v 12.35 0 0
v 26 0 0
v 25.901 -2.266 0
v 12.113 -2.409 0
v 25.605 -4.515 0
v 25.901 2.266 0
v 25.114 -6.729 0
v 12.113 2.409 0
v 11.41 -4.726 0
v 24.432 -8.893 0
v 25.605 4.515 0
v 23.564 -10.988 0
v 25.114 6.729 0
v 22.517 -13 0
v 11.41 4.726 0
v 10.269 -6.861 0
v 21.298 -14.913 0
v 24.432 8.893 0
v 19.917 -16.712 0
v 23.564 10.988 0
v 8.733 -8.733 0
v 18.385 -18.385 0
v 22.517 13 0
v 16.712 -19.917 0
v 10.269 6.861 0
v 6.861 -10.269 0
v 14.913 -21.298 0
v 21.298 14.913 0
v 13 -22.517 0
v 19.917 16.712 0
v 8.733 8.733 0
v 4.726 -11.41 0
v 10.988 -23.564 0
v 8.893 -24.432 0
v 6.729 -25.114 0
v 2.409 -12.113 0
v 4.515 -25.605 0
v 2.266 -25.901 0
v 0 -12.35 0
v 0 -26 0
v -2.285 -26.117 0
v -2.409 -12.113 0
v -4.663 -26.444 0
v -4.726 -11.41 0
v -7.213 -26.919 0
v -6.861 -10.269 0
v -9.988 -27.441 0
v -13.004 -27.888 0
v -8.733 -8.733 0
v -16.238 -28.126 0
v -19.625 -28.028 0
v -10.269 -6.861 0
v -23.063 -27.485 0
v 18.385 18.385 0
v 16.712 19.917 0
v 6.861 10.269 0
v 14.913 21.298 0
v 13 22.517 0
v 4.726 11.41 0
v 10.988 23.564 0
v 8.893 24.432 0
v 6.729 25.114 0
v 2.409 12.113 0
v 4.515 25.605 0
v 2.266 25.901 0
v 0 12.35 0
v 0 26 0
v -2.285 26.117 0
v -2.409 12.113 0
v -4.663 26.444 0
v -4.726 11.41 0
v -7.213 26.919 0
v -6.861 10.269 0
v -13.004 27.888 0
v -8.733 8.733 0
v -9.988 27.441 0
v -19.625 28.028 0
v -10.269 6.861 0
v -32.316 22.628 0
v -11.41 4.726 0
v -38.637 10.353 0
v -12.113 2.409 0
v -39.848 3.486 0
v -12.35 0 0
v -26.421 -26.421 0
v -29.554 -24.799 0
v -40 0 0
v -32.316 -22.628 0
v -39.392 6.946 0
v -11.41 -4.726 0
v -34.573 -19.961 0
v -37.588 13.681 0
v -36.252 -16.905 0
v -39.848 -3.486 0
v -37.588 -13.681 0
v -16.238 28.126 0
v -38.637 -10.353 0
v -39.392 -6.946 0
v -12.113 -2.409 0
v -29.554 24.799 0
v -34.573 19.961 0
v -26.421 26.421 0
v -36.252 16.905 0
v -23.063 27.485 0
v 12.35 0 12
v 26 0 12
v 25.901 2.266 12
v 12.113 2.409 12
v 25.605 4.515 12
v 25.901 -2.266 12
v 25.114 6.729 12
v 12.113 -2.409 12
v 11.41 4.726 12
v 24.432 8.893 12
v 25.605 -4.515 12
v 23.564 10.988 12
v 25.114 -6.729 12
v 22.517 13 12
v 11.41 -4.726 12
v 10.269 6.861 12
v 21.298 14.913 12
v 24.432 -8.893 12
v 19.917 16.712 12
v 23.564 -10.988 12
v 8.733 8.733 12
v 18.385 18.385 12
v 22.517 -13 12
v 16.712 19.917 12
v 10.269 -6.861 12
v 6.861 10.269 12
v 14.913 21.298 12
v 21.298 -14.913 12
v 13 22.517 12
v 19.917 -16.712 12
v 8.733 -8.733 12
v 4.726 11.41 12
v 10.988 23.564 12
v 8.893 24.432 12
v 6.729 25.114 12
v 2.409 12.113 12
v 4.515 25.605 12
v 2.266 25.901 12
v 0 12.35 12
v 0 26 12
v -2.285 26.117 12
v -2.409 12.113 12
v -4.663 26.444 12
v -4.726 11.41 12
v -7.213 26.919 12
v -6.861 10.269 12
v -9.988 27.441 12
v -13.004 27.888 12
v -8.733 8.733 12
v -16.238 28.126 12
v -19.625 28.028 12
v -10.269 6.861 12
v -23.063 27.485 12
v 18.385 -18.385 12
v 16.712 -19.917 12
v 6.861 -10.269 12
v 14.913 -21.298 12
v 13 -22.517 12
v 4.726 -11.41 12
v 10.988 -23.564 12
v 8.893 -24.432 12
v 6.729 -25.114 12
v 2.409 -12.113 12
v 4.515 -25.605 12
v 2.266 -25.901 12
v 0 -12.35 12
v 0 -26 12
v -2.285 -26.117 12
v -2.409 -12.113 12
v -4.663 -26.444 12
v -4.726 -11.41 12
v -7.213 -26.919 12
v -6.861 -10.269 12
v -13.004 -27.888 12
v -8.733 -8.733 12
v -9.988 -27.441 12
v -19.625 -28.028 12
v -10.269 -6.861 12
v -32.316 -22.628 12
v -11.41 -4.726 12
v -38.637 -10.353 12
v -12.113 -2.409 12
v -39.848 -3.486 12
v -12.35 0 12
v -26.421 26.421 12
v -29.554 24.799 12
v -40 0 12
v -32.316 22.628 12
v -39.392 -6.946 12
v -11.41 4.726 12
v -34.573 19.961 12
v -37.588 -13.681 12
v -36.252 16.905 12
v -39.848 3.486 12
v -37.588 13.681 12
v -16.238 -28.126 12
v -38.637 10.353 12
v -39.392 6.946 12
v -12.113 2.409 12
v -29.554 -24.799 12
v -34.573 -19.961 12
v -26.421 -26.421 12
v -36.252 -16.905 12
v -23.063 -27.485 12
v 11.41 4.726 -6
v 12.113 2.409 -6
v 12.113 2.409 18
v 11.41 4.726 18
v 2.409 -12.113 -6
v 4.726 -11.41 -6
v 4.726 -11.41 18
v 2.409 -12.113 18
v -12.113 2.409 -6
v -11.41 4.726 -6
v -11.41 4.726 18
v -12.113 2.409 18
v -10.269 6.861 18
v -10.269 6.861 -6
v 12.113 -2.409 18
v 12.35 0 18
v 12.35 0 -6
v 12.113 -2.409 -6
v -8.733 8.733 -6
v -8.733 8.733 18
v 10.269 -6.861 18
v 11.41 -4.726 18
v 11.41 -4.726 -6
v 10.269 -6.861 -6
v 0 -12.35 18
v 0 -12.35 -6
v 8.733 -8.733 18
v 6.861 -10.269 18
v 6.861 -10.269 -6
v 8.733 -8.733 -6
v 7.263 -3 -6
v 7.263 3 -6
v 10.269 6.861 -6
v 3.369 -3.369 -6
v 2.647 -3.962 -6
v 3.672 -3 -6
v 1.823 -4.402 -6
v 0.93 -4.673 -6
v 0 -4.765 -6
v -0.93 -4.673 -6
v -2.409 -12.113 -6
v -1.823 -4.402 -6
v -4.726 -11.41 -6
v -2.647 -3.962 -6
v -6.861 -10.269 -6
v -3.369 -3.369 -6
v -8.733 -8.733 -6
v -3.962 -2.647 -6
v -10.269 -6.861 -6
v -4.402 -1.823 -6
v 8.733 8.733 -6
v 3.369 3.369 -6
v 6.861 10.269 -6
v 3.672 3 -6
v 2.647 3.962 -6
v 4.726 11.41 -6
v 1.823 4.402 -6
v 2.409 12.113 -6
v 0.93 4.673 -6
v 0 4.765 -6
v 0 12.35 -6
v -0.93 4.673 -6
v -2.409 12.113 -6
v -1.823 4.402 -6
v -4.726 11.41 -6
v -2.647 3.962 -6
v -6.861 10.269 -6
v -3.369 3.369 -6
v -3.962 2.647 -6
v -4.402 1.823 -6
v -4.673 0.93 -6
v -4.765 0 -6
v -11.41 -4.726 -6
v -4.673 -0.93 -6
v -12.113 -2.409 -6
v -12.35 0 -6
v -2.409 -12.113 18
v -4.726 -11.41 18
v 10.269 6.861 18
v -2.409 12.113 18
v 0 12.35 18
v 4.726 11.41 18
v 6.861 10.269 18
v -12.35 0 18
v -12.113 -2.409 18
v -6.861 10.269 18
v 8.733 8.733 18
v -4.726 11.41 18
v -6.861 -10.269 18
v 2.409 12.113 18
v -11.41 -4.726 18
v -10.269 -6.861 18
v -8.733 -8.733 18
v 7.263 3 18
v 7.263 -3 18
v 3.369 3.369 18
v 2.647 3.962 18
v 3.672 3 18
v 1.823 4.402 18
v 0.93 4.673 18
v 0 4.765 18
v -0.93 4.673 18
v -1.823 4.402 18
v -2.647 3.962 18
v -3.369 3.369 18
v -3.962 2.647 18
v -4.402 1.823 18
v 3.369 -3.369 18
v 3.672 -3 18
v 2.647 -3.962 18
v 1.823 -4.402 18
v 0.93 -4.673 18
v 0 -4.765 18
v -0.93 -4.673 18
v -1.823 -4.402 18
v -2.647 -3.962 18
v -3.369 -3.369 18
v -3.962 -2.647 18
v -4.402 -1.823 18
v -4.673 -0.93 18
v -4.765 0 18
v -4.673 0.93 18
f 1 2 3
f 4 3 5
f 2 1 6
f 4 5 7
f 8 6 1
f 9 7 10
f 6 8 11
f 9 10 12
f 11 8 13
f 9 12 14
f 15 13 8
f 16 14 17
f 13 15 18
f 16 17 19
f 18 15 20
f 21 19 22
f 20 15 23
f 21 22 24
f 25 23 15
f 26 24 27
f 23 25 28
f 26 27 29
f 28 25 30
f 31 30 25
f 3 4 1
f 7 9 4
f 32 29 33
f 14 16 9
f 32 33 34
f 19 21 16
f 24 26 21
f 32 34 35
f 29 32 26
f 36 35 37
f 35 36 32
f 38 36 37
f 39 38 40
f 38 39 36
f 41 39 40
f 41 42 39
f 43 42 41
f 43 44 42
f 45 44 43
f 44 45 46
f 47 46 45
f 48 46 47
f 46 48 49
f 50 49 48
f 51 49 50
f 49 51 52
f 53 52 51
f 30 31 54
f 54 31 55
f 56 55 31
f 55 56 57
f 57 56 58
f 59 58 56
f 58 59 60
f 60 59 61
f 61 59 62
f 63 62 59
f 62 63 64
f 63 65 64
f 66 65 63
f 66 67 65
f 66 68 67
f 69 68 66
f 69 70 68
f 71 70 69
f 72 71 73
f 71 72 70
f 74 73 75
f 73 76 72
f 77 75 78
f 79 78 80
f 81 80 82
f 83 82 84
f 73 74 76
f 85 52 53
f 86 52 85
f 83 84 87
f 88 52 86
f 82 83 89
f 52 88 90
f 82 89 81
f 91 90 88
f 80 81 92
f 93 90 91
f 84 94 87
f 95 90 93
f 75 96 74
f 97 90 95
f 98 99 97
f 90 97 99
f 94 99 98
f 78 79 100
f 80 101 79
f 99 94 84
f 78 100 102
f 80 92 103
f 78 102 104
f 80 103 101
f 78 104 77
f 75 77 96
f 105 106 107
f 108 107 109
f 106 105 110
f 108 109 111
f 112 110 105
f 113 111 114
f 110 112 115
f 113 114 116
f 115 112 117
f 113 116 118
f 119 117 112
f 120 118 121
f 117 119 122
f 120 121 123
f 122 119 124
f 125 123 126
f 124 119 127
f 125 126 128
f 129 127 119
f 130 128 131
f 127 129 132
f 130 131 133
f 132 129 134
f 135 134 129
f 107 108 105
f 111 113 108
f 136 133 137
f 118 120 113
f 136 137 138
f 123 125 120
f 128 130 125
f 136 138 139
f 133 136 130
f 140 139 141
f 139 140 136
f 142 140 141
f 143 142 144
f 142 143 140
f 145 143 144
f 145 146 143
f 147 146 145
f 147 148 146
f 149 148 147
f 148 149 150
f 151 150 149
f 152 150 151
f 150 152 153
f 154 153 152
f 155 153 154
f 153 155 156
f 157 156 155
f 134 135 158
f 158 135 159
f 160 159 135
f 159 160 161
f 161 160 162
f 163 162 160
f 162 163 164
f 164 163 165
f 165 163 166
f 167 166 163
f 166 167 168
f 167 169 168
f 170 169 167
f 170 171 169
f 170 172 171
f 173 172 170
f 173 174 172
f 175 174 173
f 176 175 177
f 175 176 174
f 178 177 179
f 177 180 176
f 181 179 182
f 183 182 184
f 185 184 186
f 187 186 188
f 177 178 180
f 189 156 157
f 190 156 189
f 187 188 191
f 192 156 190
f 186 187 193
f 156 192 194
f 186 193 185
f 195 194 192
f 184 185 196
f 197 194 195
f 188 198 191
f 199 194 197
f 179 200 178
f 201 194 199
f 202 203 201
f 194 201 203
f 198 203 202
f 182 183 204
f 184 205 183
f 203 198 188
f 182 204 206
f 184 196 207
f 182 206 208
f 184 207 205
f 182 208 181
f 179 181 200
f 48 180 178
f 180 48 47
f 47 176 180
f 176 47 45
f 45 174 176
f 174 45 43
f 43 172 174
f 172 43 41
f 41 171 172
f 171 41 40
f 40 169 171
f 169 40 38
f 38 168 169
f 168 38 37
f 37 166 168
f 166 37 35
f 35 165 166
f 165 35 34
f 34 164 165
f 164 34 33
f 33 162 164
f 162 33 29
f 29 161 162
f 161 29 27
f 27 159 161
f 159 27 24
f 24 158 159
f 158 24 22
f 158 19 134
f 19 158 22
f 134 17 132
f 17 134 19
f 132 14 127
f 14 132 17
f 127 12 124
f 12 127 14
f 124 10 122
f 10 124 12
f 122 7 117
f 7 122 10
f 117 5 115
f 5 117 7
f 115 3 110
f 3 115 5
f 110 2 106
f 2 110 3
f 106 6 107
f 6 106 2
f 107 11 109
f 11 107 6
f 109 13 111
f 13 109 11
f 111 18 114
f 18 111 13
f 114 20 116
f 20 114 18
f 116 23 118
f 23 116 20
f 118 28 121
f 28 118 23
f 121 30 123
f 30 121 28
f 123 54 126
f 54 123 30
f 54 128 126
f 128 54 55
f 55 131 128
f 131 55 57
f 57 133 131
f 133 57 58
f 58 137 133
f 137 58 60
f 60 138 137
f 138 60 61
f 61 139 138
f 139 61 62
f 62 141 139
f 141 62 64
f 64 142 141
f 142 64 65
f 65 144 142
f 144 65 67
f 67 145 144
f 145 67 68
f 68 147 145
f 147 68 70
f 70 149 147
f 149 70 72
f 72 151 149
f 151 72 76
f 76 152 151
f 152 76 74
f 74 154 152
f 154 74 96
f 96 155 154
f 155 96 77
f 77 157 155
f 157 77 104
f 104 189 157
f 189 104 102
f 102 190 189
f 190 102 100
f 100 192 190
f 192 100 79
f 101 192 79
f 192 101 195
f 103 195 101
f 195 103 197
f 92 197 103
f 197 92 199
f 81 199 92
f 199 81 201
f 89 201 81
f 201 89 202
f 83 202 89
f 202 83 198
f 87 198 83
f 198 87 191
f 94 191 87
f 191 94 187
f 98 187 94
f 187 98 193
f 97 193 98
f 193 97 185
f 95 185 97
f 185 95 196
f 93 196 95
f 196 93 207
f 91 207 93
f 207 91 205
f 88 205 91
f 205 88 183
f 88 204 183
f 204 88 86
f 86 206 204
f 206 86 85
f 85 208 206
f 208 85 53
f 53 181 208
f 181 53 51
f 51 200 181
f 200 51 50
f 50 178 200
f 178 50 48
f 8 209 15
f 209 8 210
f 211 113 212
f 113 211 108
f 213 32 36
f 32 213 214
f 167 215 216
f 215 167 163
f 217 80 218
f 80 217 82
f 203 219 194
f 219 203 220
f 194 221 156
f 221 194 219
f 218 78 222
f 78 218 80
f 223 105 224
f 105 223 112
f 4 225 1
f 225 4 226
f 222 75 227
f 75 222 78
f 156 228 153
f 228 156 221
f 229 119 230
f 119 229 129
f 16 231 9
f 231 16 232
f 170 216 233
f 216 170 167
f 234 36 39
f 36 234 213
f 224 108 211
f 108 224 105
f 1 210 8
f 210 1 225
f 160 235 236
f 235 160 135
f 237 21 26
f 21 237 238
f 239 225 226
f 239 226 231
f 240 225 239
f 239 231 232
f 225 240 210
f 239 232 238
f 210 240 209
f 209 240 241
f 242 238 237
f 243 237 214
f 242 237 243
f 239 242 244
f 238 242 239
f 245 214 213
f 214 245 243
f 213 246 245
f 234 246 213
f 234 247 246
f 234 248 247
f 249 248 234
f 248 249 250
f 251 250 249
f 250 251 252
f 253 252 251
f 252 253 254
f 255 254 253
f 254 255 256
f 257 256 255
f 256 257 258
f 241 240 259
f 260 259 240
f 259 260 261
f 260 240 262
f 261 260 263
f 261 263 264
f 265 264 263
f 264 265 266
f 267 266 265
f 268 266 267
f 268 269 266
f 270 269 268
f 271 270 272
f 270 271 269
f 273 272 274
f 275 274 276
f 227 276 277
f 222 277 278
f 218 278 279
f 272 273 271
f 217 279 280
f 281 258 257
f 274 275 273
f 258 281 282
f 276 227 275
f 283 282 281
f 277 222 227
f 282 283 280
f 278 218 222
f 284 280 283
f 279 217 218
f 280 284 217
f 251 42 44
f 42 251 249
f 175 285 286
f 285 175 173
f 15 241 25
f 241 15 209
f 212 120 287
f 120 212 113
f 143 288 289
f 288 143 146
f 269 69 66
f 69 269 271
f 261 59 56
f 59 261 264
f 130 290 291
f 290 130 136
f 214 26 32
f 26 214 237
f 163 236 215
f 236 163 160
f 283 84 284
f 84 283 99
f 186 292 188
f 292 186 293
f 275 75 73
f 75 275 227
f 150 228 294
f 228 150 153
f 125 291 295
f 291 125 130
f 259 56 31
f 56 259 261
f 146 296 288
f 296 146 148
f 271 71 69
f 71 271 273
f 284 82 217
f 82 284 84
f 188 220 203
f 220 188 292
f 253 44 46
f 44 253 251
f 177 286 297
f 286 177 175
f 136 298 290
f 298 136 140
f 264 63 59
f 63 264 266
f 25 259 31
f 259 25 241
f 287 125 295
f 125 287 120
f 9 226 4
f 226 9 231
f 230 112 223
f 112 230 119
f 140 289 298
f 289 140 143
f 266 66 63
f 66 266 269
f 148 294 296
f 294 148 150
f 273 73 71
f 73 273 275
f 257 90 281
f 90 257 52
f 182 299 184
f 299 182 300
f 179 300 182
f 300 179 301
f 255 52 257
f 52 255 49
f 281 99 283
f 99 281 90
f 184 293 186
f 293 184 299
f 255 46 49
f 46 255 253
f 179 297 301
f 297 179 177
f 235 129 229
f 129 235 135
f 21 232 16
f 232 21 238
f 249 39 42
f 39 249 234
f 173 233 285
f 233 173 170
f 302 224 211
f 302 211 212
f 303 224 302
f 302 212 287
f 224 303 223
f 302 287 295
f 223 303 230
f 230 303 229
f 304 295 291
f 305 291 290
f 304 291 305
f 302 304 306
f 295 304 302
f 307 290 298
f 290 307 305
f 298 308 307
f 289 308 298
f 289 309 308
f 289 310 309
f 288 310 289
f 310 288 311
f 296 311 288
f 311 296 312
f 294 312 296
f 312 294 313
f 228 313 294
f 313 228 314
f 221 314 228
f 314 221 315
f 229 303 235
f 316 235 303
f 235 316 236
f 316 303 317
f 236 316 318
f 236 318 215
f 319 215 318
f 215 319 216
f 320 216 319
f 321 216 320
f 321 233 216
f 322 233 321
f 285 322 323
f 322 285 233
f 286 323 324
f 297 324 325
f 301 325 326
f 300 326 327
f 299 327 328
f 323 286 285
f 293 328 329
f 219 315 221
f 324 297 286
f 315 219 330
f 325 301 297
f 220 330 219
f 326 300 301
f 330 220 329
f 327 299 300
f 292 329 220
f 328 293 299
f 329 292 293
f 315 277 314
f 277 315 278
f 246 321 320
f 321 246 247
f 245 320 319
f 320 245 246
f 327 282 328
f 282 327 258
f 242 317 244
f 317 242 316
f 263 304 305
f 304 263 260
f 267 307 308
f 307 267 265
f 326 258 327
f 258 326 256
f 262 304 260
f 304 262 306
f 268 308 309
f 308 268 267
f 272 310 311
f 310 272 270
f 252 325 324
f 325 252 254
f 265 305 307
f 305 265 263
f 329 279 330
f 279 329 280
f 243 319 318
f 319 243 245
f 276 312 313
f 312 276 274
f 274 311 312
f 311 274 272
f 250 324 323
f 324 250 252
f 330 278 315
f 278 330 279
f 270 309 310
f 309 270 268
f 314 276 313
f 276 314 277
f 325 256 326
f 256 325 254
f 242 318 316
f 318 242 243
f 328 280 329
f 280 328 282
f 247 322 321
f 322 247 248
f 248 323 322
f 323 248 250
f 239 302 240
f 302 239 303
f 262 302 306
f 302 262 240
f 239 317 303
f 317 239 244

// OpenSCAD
$fn = 32;

// ----------------------------------------------------------------------
// Cam: base radius 26 mm with a 14 mm lift over 180 degrees
// ----------------------------------------------------------------------

// --- parameters (mm) ---
base_r = 26;              // base radius
lift = 14;                // lift height above the base radius
lift_span = 180;          // angular width of the lift
lift_start = 90;          // angle where the lift starts
cam_t = 12;               // cam plate thickness
hub_d = 24.7;             // hub diameter
hub_h = 24;               // hub height
bore_d = 9.53;            // bore
key_w = 6;                // keyway width
key_depth = 3;            // keyway depth

cam_profile = [[26, 0], [25.901, 2.266], [25.605, 4.515], [25.114, 6.729], [24.432, 8.893], [23.564, 10.988], [22.517, 13], [21.298, 14.913], [19.917, 16.712], [18.385, 18.385], [16.712, 19.917], [14.913, 21.298], [13, 22.517], [10.988, 23.564], [8.893, 24.432], [6.729, 25.114], [4.515, 25.605], [2.266, 25.901], [0, 26], [-2.285, 26.117], [-4.663, 26.444], [-7.213, 26.919], [-9.988, 27.441], [-13.004, 27.888], [-16.238, 28.126], [-19.625, 28.028], [-23.063, 27.485], [-26.421, 26.421], [-29.554, 24.799], [-32.316, 22.628], [-34.573, 19.961], [-36.252, 16.905], [-37.588, 13.681], [-38.637, 10.353], [-39.392, 6.946], [-39.848, 3.486], [-40, 0], [-39.848, -3.486], [-39.392, -6.946], [-38.637, -10.353], [-37.588, -13.681], [-36.252, -16.905], [-34.573, -19.961], [-32.316, -22.628], [-29.554, -24.799], [-26.421, -26.421], [-23.063, -27.485], [-19.625, -28.028], [-16.238, -28.126], [-13.004, -27.888], [-9.988, -27.441], [-7.213, -26.919], [-4.663, -26.444], [-2.285, -26.117], [0, -26], [2.266, -25.901], [4.515, -25.605], [6.729, -25.114], [8.893, -24.432], [10.988, -23.564], [13, -22.517], [14.913, -21.298], [16.712, -19.917], [18.385, -18.385], [19.917, -16.712], [21.298, -14.913], [22.517, -13], [23.564, -10.988], [24.432, -8.893], [25.114, -6.729], [25.605, -4.515], [25.901, -2.266]];

difference() {
  union() {
    linear_extrude(height = cam_t) polygon(cam_profile);
    /* hub, proud of the cam plate on both sides */
    translate([0, 0, -6]) cylinder(h = hub_h, d = hub_d);
  }
  /* bore through the hub, 2.5 mm clear on both faces */
  translate([0, 0, -8.5]) cylinder(h = hub_h + 5, d = bore_d);
  /* keyway, milled through the whole hub */
  translate([1.763, -3, -8.5]) cube([5.5, 6, 29]);
}
